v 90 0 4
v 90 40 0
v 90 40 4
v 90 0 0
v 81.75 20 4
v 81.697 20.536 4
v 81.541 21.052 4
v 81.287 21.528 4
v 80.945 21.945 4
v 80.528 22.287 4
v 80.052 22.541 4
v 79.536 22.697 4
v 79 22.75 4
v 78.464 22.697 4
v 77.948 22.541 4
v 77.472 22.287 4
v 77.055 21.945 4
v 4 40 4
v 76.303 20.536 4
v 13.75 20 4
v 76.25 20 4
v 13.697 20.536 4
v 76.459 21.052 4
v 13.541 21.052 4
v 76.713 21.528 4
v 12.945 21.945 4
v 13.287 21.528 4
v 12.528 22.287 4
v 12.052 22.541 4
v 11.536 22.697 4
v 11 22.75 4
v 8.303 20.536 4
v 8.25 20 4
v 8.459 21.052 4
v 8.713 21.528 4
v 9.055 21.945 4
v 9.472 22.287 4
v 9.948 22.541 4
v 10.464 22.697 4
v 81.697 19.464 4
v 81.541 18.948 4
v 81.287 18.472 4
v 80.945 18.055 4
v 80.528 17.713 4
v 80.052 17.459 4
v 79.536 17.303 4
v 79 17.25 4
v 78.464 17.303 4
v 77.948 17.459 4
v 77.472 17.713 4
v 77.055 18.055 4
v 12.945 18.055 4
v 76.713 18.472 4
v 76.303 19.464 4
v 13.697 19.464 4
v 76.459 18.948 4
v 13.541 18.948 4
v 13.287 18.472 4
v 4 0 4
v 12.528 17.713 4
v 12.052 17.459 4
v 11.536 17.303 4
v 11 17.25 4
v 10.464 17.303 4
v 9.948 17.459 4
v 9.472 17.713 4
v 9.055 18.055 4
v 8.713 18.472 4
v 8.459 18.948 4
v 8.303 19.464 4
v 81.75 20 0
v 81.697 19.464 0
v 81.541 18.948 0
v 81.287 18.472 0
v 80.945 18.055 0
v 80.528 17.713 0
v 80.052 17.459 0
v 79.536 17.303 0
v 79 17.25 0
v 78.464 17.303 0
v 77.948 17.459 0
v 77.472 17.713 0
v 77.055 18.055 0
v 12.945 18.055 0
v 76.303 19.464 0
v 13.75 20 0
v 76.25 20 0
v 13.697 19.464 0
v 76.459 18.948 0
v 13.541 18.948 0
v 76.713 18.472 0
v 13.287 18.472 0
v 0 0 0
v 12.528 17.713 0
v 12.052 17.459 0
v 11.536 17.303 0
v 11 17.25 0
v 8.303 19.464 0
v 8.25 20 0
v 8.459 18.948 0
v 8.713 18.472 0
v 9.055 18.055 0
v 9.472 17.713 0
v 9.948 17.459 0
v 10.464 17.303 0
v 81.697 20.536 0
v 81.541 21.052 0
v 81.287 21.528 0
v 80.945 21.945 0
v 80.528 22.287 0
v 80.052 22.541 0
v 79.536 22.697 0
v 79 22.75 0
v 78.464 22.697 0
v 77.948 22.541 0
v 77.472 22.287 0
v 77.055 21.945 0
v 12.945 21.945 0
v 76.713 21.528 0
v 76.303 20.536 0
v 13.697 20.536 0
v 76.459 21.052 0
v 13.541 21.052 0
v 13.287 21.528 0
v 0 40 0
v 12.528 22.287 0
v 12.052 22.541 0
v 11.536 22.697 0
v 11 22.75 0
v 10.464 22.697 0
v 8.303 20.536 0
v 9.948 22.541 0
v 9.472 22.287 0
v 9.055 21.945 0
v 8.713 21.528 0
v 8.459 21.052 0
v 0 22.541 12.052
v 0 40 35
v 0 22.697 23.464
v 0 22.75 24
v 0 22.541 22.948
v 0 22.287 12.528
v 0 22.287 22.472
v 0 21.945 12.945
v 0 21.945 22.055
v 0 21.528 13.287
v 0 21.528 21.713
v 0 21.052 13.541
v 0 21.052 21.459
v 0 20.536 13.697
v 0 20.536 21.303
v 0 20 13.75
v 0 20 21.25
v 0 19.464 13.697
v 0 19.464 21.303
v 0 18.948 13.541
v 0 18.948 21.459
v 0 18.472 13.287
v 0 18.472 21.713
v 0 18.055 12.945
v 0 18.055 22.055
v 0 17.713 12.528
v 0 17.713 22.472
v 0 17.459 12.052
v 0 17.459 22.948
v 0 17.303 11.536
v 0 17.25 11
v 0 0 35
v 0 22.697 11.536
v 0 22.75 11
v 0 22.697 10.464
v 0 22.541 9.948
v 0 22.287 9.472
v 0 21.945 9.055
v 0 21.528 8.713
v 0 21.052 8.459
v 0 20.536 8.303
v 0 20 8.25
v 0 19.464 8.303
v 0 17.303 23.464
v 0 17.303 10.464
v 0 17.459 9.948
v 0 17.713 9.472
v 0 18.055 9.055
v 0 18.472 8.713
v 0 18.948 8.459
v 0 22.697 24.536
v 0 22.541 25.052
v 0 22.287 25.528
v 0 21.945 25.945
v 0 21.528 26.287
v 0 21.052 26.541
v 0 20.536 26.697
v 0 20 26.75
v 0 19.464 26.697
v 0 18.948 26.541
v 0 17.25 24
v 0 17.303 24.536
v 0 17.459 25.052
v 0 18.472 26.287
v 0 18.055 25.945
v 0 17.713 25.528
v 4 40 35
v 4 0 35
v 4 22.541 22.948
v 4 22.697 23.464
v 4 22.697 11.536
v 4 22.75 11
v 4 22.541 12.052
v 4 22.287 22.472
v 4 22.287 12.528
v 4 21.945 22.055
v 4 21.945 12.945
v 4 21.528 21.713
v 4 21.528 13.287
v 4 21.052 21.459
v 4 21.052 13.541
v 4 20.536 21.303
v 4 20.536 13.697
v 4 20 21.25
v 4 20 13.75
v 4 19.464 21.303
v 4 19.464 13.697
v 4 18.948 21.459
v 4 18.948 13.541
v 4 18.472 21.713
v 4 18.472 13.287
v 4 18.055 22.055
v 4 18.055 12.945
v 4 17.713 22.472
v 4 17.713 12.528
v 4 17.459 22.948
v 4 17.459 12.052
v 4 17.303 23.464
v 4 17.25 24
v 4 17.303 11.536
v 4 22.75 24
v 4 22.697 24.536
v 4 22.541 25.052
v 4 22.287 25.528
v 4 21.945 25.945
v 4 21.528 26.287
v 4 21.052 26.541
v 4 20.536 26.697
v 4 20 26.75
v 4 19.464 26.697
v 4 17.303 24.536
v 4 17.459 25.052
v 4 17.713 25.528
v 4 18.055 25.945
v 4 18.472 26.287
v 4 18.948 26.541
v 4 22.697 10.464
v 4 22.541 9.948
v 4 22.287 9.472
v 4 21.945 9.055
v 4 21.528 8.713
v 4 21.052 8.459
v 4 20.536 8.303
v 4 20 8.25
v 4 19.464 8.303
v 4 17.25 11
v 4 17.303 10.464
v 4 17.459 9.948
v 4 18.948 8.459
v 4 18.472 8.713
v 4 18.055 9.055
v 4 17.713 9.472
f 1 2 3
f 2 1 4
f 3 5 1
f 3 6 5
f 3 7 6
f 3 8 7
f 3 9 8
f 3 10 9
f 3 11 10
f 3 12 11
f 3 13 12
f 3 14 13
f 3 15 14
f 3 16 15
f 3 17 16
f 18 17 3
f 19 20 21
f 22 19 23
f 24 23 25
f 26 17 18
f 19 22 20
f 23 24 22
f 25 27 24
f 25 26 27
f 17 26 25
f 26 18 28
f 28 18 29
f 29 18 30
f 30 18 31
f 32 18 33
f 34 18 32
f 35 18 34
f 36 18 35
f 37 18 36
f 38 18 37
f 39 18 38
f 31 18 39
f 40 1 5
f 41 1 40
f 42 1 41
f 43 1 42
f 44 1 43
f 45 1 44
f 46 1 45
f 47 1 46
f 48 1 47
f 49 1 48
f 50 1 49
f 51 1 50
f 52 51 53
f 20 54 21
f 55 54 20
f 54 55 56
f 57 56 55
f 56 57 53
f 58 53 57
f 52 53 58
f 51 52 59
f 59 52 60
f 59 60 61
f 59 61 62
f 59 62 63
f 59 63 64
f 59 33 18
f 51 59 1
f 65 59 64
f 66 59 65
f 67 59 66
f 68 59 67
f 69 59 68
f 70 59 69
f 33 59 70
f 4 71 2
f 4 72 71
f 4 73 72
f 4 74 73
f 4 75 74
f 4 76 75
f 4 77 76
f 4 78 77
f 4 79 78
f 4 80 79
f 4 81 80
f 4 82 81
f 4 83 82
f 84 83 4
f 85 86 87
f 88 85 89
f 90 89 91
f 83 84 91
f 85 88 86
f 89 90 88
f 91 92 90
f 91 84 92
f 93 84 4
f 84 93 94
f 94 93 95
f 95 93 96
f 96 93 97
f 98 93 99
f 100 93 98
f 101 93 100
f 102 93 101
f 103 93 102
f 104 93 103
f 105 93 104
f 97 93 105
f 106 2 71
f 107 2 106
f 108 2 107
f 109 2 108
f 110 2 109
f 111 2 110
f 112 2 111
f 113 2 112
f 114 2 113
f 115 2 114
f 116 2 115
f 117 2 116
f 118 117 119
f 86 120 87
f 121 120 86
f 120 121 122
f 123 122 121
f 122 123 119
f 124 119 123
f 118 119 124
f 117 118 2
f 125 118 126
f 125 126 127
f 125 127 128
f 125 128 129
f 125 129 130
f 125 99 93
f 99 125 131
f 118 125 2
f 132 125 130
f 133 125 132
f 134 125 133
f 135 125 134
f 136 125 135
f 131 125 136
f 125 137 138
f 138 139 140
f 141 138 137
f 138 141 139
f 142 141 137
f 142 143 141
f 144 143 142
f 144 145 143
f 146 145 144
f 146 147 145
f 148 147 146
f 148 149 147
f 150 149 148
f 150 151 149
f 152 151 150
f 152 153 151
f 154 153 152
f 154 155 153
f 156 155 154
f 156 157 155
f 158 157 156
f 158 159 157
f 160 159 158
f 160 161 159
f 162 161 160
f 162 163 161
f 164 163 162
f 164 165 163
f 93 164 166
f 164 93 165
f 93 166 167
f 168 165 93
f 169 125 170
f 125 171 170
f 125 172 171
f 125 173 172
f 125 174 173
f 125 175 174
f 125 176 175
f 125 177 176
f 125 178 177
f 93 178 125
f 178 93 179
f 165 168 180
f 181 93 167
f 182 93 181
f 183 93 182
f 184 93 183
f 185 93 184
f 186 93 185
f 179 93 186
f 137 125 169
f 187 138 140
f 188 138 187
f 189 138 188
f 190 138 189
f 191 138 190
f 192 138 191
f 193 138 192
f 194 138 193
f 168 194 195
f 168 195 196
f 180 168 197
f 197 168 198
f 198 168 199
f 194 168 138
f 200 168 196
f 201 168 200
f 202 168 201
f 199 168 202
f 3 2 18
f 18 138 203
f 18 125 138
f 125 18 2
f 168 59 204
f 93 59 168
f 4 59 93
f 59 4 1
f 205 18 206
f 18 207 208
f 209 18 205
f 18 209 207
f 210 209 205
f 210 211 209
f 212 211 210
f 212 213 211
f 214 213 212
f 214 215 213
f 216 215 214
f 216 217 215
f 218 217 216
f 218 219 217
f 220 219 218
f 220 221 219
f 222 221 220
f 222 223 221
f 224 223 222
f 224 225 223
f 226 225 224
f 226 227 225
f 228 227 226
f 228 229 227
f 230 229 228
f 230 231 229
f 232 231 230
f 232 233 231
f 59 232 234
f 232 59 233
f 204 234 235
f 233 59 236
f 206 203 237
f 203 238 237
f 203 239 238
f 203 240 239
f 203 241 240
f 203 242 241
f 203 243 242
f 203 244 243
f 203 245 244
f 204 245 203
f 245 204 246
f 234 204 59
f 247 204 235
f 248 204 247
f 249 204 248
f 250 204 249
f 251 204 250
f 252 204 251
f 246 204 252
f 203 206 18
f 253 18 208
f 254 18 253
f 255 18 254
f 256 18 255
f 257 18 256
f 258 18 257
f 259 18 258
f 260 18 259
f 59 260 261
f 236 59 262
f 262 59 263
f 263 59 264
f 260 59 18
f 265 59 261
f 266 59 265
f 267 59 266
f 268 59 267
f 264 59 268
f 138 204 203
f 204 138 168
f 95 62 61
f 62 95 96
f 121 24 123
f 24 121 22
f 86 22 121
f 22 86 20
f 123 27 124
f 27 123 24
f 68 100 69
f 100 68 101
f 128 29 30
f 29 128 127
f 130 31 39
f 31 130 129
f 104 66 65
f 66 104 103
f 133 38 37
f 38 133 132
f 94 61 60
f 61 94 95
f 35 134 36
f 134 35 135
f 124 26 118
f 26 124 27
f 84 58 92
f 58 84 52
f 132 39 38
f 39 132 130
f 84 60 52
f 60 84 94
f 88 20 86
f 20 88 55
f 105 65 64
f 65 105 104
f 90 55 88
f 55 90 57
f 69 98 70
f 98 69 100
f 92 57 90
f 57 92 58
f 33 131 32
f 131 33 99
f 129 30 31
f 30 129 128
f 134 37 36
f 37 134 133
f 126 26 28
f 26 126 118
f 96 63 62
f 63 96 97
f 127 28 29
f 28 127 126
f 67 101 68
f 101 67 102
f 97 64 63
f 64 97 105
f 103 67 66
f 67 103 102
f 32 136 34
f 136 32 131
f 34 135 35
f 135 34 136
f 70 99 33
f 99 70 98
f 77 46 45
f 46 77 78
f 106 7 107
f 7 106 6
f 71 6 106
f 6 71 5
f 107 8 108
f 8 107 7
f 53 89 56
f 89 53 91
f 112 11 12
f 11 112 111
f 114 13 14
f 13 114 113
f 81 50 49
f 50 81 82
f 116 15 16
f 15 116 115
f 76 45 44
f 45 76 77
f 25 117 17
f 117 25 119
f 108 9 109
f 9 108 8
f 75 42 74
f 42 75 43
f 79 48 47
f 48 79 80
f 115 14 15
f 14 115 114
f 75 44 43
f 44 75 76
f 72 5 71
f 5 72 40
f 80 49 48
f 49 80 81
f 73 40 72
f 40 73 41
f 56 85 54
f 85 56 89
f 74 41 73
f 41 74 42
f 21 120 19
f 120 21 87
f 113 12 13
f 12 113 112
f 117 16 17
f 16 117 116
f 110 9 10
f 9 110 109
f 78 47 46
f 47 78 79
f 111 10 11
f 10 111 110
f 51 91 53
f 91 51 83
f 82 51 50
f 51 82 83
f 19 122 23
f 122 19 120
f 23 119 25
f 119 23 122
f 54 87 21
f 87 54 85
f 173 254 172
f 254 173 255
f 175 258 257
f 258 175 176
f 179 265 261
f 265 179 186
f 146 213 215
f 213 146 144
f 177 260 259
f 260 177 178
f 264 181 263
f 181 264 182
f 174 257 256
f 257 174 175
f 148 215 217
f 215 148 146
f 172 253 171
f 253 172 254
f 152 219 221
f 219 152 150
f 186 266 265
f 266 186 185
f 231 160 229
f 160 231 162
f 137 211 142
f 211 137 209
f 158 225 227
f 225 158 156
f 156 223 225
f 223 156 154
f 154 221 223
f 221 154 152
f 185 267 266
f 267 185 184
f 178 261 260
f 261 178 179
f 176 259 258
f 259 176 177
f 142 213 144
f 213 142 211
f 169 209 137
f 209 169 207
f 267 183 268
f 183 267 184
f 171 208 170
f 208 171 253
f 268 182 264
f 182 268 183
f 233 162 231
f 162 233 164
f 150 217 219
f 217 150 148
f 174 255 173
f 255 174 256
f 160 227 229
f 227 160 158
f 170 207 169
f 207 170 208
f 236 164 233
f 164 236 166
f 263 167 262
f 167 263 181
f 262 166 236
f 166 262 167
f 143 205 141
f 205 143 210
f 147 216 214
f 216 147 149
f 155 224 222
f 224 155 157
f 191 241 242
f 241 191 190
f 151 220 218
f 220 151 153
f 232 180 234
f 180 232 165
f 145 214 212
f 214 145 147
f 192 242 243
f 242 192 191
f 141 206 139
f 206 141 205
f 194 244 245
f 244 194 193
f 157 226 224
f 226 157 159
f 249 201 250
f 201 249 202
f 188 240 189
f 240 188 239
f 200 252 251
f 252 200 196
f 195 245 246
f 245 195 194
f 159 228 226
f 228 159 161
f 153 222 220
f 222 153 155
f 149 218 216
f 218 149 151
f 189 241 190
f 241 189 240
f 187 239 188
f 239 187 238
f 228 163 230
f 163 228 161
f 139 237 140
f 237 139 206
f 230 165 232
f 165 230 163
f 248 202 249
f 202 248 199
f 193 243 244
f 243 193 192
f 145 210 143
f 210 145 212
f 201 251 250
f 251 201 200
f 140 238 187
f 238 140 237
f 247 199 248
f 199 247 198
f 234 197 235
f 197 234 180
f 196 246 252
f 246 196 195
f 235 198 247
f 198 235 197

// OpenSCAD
$fn = 32;

// ----------------------------------------------------------------------
// L-bracket: 90 x 40 x 35 mm
// ----------------------------------------------------------------------

// --- parameters (mm) ---
base_len = 90;            // horizontal leg, X
upright_h = 35;           // vertical leg, Z
flange_w = 40;            // bracket depth, Y
mat_t = 4;                // plate thickness
hole_d = 5.5;             // clearance for M5

module hole_z(px, py) {
  translate([px, py, -0.5]) cylinder(h = mat_t + 1, d = hole_d);
}
module hole_x(pz, py) {
  translate([-0.5, py, pz]) rotate([0, 90, 0]) cylinder(h = mat_t + 1, d = hole_d);
}

difference() {
  union() {
    /* horizontal leg */
    cube([base_len, flange_w, mat_t]);
    /* vertical leg, overlapping the corner block */
    cube([mat_t, flange_w, upright_h]);
  }
  hole_z(11, 20);
  hole_z(79, 20);
  hole_x(11, 20);
  hole_x(24, 20);
}
